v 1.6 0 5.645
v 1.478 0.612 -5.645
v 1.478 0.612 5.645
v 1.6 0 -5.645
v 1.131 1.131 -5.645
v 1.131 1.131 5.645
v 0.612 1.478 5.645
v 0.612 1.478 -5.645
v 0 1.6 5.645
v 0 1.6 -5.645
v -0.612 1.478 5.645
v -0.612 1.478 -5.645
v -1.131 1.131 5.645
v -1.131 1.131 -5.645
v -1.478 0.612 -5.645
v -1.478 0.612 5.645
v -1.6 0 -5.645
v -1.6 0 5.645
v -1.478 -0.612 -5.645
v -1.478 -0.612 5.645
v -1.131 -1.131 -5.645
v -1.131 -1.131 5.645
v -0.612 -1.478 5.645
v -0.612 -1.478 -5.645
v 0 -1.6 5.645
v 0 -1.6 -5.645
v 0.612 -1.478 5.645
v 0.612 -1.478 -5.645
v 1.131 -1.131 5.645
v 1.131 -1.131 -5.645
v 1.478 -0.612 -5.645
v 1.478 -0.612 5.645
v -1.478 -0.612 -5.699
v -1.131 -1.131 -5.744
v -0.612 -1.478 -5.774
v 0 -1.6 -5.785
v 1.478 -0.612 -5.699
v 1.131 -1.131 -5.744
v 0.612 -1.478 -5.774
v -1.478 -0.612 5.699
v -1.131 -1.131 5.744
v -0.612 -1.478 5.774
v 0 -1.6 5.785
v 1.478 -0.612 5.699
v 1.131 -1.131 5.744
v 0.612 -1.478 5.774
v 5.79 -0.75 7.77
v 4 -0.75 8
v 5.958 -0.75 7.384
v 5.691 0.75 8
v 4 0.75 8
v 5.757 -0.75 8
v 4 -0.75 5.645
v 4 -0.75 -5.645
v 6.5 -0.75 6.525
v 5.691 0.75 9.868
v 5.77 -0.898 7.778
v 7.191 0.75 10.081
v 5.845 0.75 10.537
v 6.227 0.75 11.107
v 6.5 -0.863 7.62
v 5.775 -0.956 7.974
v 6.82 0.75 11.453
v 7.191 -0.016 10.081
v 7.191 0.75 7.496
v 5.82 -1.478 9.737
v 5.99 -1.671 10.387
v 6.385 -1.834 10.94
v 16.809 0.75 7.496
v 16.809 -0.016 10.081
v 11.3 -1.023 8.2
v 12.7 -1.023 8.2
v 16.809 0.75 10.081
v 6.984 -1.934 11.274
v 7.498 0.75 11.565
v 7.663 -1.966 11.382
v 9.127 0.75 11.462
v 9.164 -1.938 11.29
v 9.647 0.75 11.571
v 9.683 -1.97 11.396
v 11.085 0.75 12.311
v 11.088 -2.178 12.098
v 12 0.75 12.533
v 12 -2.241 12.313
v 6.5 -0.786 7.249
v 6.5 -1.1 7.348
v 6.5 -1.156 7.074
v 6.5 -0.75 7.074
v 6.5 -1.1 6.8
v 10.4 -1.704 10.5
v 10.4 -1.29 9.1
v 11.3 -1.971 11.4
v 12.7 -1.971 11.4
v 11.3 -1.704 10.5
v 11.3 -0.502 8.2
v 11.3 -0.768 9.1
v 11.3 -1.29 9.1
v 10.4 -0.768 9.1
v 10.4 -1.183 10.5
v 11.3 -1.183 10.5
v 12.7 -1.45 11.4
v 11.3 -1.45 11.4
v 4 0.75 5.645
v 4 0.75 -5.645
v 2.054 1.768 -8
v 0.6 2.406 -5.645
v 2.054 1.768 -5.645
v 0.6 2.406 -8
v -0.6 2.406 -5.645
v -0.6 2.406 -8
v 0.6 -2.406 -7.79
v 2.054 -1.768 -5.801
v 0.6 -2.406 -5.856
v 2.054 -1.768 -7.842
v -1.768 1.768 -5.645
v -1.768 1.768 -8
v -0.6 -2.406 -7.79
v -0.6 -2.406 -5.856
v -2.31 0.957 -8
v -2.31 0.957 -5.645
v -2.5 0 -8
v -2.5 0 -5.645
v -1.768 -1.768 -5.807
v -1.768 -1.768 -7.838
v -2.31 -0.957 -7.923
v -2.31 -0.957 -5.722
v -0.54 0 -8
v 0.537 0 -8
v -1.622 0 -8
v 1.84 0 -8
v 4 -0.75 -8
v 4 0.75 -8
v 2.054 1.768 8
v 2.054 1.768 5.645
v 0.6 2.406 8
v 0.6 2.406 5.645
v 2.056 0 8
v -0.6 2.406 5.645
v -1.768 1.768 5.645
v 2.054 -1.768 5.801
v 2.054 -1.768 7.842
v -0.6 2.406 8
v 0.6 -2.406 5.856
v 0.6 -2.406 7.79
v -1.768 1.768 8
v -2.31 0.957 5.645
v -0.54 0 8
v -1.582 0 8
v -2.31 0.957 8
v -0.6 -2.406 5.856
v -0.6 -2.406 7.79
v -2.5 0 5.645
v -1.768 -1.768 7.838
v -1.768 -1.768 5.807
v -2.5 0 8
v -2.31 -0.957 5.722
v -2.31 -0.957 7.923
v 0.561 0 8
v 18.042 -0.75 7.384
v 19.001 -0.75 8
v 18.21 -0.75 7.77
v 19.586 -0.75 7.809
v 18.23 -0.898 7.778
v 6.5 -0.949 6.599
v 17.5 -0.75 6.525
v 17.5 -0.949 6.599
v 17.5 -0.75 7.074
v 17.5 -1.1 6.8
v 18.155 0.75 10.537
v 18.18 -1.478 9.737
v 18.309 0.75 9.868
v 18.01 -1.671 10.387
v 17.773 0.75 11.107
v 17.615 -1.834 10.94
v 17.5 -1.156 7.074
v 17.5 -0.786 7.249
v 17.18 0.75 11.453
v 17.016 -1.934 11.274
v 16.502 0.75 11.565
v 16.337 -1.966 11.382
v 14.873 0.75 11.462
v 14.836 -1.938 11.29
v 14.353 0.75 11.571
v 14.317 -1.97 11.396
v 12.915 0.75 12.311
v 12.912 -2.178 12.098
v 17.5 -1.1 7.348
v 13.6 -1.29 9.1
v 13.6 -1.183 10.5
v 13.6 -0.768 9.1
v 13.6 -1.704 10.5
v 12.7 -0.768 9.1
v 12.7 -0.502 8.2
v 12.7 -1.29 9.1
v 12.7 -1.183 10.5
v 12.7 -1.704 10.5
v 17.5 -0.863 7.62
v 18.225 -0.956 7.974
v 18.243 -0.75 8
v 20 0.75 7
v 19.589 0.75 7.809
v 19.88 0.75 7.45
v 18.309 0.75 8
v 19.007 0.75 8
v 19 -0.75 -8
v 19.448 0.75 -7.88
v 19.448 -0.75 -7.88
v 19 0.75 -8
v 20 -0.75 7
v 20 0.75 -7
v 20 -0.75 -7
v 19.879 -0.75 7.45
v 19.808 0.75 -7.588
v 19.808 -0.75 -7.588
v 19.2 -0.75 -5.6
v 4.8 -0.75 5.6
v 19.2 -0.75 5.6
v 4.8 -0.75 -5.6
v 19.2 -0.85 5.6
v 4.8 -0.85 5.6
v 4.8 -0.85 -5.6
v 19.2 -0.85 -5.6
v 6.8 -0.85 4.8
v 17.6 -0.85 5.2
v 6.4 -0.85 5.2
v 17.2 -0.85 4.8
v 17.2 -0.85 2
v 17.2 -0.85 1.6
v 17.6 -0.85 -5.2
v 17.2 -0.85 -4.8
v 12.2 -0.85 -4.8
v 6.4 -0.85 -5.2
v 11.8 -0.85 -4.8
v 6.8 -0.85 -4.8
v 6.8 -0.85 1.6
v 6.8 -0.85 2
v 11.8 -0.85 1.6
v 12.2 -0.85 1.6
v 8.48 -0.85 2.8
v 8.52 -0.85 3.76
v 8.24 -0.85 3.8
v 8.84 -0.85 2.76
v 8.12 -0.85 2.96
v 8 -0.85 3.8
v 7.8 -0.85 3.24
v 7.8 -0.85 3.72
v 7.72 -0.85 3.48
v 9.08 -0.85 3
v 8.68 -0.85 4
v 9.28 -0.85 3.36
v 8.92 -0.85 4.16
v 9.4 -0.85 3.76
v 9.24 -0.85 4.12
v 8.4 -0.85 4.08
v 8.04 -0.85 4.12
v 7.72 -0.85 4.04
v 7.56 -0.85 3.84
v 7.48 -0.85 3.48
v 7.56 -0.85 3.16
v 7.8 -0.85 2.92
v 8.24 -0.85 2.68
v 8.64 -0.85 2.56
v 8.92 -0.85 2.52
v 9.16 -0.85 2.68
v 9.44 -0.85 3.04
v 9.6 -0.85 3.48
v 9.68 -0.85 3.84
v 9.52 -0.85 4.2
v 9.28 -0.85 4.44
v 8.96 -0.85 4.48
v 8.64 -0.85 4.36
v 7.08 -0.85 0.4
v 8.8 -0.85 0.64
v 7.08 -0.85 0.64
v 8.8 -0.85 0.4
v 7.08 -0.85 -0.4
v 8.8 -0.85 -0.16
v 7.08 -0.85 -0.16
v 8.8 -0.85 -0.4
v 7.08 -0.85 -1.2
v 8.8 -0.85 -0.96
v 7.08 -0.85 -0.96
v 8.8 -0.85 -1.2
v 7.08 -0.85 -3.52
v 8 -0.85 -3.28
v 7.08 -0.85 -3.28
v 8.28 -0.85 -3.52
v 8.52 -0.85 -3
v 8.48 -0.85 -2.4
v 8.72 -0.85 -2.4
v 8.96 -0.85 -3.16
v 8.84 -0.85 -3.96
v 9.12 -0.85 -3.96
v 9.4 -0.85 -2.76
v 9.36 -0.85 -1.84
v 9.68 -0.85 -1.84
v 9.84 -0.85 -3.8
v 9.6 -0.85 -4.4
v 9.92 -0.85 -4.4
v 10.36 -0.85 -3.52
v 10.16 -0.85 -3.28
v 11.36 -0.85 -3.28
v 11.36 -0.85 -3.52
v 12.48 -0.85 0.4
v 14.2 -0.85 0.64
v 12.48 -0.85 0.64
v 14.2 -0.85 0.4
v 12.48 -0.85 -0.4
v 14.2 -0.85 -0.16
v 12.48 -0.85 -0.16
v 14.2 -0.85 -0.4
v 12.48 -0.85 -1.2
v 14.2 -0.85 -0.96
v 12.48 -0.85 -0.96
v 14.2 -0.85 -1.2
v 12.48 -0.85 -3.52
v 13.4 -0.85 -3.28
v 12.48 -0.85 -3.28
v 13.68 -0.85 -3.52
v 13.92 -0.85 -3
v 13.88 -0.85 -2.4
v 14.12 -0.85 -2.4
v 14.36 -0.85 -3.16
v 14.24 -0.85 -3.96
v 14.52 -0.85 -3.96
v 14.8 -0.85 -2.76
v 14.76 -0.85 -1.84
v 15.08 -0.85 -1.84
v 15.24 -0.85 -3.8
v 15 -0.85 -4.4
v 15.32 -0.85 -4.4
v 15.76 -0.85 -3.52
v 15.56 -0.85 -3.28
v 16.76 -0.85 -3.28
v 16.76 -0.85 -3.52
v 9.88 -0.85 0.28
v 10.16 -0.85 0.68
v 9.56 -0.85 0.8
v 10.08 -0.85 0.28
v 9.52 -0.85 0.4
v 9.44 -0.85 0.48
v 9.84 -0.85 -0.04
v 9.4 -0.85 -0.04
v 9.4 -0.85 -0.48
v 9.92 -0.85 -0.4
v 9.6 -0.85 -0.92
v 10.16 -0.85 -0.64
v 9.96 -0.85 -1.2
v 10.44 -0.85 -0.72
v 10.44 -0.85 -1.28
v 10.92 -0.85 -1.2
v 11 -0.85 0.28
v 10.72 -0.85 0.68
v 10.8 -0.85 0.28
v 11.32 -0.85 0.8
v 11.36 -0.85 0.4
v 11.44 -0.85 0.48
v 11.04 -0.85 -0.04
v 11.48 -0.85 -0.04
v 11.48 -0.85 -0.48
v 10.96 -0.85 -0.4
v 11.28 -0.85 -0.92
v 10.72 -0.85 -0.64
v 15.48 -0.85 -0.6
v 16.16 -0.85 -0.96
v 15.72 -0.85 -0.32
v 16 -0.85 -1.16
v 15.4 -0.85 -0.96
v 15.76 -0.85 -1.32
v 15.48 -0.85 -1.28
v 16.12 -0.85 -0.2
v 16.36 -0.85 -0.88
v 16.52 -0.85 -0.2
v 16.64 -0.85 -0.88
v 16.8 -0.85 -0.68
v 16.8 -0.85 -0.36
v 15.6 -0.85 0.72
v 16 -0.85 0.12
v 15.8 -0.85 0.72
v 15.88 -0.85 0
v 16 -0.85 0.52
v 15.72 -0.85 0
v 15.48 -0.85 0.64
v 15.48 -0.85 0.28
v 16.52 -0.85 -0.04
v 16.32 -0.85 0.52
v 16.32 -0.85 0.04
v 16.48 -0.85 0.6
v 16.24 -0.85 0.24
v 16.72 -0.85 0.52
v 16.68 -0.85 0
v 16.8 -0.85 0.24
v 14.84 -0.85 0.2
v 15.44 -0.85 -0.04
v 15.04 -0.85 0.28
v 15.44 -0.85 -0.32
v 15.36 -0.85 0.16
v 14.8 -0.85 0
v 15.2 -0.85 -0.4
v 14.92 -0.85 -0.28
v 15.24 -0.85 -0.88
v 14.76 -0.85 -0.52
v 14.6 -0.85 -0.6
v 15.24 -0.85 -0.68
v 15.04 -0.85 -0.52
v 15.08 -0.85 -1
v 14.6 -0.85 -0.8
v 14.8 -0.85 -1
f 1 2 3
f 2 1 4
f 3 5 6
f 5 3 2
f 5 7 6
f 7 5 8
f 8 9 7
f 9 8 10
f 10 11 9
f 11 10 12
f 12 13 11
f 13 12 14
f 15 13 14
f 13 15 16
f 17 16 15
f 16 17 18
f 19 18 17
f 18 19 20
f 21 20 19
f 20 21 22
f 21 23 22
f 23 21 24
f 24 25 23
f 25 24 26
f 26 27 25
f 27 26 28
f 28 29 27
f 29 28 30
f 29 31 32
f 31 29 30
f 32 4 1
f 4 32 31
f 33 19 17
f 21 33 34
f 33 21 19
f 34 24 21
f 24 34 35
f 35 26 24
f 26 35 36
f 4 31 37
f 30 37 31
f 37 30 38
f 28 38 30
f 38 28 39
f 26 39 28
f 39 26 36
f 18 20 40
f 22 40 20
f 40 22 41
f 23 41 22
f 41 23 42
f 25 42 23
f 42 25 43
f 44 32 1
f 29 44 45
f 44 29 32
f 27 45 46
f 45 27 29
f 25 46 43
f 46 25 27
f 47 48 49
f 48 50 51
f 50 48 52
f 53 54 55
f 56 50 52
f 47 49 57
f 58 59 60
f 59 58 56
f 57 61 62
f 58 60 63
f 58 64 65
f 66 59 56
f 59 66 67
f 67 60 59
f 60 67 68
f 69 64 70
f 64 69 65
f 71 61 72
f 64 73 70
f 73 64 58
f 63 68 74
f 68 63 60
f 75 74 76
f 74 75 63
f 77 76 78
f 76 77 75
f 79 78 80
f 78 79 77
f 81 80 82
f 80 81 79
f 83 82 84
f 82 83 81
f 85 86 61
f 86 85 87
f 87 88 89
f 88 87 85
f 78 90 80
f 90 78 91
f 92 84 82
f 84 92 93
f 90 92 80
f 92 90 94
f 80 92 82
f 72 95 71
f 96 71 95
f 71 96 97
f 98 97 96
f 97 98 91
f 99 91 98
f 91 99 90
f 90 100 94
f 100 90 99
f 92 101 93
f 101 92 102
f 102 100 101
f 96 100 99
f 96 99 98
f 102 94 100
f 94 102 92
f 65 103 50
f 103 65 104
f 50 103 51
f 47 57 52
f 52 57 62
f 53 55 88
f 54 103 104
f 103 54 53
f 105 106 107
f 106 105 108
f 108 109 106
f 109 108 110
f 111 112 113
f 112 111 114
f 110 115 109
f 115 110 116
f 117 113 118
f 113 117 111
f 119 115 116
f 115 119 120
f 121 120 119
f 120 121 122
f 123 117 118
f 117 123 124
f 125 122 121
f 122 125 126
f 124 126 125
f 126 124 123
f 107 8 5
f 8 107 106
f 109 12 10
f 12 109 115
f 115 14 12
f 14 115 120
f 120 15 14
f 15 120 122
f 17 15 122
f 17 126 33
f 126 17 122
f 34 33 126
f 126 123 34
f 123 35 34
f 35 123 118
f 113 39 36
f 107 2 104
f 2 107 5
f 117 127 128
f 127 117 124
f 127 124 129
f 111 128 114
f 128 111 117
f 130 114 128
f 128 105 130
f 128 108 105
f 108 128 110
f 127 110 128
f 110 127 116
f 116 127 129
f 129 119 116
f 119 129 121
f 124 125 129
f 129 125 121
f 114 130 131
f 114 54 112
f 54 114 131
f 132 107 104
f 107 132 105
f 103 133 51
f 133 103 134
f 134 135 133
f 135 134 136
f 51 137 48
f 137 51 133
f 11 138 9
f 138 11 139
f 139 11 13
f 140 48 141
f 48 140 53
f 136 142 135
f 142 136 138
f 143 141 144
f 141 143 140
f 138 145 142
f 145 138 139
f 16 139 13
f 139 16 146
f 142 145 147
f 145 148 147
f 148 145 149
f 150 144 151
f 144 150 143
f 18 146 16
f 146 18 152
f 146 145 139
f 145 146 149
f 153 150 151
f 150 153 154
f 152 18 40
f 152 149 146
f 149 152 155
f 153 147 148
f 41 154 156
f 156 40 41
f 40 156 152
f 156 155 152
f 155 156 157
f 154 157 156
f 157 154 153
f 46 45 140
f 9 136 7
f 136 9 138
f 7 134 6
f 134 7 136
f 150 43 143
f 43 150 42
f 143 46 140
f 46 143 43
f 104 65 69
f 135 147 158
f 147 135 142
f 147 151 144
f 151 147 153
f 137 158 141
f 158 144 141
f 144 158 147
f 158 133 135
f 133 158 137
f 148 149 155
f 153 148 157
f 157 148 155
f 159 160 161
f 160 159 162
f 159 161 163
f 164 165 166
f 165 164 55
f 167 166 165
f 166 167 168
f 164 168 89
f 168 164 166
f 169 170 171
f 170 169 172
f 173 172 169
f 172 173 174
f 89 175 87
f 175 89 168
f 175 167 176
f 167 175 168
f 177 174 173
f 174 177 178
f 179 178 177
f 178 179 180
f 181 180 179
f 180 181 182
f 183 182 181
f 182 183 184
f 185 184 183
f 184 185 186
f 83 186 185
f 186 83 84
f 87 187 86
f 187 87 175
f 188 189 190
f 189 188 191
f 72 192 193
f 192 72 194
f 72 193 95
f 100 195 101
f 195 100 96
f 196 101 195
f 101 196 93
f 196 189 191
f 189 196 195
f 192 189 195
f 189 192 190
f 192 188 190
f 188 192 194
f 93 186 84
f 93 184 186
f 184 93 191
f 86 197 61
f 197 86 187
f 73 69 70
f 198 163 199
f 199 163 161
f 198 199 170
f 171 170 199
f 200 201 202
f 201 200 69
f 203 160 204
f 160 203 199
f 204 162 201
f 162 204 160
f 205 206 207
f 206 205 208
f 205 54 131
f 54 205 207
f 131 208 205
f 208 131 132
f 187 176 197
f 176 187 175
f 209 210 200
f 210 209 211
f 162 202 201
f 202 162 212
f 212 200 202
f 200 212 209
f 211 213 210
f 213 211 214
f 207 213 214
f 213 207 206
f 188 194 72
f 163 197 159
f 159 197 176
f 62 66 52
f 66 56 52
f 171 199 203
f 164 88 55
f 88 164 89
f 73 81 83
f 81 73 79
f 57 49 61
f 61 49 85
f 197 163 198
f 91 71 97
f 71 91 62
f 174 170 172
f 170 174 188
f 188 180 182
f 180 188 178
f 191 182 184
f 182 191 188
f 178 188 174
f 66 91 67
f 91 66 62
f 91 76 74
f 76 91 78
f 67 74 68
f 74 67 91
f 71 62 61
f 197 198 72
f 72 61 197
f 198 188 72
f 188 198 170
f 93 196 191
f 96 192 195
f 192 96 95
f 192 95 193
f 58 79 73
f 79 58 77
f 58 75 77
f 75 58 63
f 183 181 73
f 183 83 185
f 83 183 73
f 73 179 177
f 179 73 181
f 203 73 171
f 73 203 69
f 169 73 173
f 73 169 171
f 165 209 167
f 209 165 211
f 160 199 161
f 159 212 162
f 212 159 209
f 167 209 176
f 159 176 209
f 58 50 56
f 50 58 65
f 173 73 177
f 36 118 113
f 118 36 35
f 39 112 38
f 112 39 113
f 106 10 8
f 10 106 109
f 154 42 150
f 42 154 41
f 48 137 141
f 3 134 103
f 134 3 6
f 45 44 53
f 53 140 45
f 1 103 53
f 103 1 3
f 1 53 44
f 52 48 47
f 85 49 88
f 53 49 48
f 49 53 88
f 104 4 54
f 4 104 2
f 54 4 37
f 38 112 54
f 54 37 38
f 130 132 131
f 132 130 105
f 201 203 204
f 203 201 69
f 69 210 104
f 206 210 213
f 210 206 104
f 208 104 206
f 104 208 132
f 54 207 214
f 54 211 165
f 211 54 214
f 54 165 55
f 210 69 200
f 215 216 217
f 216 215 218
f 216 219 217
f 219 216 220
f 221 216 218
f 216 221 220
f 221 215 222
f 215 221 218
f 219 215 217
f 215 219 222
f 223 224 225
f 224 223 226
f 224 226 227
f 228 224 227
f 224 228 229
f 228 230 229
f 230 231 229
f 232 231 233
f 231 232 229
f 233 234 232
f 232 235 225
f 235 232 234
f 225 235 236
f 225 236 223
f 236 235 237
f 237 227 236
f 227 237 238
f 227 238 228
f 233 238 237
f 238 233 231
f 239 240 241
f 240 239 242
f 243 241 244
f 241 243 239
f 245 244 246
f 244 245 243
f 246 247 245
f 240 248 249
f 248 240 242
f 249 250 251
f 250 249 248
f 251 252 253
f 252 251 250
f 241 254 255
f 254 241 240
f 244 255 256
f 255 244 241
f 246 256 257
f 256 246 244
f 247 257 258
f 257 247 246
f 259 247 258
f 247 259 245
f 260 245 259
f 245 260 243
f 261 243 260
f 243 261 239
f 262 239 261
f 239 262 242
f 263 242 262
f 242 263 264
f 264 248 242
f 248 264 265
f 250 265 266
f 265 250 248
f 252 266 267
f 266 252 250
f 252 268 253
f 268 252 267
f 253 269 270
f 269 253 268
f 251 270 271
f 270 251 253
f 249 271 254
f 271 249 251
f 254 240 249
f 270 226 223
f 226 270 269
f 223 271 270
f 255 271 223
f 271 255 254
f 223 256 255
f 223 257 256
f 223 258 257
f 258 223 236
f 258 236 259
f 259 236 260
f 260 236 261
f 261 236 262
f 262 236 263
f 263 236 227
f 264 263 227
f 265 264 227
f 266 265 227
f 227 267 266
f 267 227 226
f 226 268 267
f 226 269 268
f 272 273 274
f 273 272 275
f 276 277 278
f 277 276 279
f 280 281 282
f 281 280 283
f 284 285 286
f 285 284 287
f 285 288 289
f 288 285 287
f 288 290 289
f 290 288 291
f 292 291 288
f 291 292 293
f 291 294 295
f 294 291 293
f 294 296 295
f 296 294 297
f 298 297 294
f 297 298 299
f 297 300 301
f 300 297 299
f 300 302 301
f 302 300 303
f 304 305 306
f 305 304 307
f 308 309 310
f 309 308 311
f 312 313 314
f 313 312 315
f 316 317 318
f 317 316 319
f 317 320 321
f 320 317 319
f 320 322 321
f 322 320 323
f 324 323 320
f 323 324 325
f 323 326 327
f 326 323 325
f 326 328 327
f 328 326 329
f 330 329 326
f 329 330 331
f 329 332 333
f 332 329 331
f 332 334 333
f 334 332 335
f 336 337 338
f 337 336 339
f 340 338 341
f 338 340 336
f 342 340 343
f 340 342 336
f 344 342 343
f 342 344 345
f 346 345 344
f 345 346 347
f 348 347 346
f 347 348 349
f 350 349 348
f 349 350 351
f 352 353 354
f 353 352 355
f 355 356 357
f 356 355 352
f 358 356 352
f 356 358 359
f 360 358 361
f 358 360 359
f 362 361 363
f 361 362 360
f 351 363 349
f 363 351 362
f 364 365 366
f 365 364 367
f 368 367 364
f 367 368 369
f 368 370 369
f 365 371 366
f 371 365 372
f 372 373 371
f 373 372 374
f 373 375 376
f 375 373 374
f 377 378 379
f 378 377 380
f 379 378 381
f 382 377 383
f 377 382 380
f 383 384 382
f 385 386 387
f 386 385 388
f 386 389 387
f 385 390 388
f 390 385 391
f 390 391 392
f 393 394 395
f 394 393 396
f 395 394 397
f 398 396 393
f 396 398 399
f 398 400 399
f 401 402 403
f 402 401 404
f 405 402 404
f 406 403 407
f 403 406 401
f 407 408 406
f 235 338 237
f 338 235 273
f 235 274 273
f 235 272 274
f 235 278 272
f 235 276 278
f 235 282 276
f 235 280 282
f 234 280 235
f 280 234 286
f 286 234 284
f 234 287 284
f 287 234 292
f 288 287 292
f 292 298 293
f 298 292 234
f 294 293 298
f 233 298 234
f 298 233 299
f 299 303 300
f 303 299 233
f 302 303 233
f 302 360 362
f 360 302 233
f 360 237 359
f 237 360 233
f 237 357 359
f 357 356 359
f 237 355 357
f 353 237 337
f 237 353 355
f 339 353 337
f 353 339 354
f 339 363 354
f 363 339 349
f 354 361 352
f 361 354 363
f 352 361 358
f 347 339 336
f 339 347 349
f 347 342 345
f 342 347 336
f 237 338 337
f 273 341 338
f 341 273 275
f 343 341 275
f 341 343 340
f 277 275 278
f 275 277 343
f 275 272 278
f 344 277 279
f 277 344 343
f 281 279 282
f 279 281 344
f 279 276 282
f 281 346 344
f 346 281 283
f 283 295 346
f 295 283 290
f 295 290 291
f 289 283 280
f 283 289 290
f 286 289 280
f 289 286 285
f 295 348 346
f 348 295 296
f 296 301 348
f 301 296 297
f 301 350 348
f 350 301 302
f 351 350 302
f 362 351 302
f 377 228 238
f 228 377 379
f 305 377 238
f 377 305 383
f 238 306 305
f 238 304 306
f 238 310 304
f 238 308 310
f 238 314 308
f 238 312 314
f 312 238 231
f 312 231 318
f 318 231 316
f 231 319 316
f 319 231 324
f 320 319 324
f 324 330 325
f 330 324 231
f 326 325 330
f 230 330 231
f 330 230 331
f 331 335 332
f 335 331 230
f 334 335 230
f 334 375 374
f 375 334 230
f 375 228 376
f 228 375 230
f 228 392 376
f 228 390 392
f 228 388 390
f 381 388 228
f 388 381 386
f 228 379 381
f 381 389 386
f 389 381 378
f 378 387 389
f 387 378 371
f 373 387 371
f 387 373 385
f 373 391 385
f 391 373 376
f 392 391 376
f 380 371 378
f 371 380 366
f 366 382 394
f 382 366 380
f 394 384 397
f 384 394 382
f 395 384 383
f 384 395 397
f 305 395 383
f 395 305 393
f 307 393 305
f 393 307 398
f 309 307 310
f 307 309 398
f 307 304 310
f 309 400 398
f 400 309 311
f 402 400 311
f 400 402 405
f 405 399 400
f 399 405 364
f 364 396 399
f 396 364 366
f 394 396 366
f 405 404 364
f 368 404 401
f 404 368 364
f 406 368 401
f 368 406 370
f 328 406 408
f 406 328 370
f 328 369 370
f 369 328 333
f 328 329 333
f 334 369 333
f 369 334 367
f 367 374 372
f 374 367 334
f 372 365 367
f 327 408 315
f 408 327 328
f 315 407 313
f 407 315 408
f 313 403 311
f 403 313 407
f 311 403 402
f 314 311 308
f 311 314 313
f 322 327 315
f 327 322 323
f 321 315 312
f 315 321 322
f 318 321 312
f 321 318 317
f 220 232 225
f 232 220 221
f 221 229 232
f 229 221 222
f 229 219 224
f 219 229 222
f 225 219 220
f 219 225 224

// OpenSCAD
use <../lib.scad>
use <4650852l.scad>
use <98393b.scad>
function ldraw_lib__98393bd01() = [
// 0 Figure Friends Medical Clipboard with Pink Heart, Yellow Horseshoe, Paw Print and White Heart Monitor Lines Sticker
// 0 Name: 98393bd01.dat
// 0 Author: Takeshi Takahashi [RainbowDolphin]
// 0 !LDRAW_ORG Shortcut UPDATE 2024-09
// 0 !LICENSE Licensed under CC BY 4.0 : see CAreadme.txt
// 
// 0 BFC CERTIFY CCW
  [0,"BFC","CERTIFY"],
  [0,"BFC","CCW"],
// 
// 0 !CATEGORY Sticker Shortcut
// 0 !KEYWORDS Bricklink 98393bpb01, Heartlake vet, Set 3188
// 
// 0 !HISTORY 2024-10-27 [OrionP] Official Update 2024-09
// 
// 1 16 0 0 0 1 0 0 0 1 0 0 0 1 98393b.dat
  [1,16,0,0,0,1,0,0,0,1,0,0,0,1, ldraw_lib__98393b()],
// 1 16 30 0 -1.875 1 0 0 0 0 -1 0 1 0 4650852l.dat
  [1,16,30,0,-1.875,1,0,0,0,0,-1,0,1,0, ldraw_lib__4650852l()],
];
module ldraw_lib__98393bd01(step=0, col=false, unit=2/5, alt=false, line=0.2, solid=!$preview)
    makepoly(ldraw_lib__98393bd01(), step=step, col=col, unit=unit, alt=alt, line=line, solid=solid);
ldraw_lib__98393bd01(line=0.2);
